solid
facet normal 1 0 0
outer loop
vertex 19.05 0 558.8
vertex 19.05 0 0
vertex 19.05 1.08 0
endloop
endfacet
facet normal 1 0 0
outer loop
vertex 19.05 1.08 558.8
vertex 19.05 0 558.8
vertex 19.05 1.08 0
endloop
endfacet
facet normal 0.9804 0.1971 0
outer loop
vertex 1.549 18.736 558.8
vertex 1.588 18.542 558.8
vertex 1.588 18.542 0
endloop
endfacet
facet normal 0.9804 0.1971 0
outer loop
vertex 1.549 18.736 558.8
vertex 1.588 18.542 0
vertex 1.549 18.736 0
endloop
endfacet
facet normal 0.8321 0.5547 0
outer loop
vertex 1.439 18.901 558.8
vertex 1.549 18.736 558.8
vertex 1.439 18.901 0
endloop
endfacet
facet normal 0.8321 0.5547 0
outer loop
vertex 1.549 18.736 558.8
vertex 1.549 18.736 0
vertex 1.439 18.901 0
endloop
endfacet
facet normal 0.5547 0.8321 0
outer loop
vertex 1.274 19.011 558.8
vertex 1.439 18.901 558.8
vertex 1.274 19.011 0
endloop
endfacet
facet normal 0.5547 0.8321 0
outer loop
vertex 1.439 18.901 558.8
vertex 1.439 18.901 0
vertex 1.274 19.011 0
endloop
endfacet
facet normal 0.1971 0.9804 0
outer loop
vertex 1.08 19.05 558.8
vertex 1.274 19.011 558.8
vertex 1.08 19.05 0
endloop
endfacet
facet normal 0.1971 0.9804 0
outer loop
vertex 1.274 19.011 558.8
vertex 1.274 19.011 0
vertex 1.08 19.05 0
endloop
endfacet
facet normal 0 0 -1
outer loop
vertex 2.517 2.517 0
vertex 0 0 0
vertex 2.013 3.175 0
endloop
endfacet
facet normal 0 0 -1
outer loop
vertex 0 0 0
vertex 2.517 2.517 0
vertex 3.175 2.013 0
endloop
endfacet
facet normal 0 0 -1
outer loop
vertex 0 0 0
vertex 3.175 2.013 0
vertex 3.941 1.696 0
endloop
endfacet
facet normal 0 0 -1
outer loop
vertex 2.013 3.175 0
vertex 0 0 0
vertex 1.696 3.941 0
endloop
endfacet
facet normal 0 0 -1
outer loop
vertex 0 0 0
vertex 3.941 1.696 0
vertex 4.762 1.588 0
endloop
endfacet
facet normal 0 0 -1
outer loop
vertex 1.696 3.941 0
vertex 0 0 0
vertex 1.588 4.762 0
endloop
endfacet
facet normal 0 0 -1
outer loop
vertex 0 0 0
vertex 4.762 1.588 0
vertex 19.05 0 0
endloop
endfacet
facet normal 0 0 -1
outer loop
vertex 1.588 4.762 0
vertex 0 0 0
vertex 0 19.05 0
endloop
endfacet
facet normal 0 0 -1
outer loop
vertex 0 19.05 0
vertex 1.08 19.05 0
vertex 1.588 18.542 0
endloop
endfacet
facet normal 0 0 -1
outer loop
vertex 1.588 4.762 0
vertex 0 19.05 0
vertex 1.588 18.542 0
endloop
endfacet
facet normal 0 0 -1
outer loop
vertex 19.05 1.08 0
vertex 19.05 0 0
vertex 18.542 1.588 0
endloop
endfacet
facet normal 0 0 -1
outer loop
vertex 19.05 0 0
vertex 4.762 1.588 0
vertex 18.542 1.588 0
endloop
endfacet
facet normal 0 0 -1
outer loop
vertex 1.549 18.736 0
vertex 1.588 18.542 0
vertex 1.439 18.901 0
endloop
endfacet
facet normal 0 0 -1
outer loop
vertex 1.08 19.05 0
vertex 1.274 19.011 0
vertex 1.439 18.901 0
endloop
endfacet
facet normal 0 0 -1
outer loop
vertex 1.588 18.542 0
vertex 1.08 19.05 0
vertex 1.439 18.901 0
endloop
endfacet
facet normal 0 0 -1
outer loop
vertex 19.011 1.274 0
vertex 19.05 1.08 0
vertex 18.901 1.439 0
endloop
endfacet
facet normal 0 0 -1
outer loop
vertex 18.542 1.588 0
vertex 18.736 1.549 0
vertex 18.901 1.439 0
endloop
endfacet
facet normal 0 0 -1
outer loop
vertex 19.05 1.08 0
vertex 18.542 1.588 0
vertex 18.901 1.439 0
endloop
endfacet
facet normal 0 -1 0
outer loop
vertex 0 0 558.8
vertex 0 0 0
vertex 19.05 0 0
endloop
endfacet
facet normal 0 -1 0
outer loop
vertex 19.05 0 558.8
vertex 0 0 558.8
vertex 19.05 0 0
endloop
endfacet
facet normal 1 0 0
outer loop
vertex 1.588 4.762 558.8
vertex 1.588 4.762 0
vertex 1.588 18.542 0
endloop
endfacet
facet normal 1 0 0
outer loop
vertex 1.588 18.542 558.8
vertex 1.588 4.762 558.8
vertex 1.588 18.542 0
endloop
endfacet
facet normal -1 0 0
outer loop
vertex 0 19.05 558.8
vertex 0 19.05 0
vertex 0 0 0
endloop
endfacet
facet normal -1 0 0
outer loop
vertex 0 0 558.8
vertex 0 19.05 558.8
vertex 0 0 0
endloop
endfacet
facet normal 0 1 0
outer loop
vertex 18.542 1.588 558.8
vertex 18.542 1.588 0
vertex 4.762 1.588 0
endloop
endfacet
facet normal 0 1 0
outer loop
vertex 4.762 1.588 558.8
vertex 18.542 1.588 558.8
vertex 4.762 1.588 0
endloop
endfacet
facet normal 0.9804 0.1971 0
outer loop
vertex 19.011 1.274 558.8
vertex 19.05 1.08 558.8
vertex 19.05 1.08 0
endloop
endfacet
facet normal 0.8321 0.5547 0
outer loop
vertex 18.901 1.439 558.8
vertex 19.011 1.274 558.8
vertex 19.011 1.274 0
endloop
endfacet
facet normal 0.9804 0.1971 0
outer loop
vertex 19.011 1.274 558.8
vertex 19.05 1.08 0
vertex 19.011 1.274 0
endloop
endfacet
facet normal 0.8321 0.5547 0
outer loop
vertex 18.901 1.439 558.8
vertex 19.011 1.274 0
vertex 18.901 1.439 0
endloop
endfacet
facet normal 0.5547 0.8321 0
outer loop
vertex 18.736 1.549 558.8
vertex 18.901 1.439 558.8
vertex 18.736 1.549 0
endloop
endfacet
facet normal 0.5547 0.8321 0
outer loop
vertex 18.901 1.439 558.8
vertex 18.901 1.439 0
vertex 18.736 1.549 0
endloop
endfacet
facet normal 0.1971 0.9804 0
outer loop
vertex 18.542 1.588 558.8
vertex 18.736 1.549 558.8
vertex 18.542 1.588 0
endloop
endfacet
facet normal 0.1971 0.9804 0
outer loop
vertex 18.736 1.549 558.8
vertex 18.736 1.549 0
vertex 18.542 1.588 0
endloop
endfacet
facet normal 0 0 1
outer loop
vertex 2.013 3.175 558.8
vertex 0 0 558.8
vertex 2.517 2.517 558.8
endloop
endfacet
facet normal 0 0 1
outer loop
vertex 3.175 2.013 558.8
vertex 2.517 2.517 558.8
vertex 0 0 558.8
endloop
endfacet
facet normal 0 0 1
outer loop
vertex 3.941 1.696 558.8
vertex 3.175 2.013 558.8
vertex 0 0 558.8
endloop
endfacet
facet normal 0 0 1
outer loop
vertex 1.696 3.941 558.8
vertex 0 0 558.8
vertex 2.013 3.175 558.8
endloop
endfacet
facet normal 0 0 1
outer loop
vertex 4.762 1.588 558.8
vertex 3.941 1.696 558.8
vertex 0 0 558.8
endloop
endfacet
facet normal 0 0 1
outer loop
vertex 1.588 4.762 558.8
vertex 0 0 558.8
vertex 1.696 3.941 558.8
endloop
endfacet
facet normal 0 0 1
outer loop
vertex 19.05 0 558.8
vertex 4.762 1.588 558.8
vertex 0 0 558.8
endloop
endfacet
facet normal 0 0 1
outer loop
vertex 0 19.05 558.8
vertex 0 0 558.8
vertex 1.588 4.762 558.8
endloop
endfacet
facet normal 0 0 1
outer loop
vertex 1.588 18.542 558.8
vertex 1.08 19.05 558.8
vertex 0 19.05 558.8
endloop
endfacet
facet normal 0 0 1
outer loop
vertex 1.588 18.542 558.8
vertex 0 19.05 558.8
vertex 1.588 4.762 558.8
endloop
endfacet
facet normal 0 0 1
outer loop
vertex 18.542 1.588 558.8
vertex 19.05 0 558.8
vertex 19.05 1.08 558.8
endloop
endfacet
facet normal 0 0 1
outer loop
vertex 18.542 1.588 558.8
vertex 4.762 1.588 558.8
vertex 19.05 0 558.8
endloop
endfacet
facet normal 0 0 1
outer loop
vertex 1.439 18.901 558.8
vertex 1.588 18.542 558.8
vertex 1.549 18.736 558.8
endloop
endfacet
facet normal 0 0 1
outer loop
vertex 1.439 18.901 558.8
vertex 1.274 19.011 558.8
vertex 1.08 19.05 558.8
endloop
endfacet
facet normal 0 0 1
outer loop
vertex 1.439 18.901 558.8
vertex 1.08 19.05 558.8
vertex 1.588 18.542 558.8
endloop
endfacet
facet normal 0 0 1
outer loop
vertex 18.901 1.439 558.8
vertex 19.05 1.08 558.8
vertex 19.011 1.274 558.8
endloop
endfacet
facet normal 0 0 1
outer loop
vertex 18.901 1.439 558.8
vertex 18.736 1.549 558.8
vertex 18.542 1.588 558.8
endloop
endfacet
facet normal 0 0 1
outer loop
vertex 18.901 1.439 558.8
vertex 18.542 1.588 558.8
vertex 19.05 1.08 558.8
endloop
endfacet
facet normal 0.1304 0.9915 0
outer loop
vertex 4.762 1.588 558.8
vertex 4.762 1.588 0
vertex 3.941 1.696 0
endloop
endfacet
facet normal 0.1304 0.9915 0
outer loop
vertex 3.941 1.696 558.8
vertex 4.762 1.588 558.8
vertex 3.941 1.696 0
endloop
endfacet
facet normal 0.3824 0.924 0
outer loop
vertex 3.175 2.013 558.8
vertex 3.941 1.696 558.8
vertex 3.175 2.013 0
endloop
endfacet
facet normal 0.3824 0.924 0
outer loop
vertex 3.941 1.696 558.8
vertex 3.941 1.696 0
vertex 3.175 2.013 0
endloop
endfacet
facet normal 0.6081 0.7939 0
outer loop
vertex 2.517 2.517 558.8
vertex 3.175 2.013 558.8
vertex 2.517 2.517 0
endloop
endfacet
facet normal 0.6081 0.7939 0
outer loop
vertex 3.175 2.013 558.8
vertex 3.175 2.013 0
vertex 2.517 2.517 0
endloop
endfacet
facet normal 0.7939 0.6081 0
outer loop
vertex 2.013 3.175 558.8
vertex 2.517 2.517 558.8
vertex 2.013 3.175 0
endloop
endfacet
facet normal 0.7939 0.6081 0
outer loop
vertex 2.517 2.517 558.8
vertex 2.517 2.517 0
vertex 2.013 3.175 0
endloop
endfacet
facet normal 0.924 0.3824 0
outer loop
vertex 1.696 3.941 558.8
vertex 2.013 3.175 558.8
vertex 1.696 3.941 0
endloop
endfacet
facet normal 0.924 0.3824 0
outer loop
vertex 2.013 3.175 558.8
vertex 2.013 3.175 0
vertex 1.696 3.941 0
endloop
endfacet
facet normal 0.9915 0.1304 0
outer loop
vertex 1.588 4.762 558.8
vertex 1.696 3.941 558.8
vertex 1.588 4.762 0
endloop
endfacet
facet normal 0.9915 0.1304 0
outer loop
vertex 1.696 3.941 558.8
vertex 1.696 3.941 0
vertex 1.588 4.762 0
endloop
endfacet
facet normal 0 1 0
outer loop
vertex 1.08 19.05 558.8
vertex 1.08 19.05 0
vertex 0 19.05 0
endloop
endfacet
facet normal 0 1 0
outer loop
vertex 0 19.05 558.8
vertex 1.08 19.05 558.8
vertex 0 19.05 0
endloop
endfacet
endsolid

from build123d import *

# Parameters (mm, degrees)
F1_DEPTH = 558.8


with BuildPart() as f1:
    # F0 (on Top) → F1 (new body)
    with BuildSketch(Plane.XY):
        with BuildLine():
            Line((0, 19.05), (0, 0))
            Line((0, 0), (19.05, 0))
            Line((19.05, 0), (19.05, 1.0795))
            ThreePointArc((19.05, 1.0795), (18.90121, 1.43871), (18.542, 1.5875))
            Line((18.542, 1.5875), (4.7625, 1.5875))
            ThreePointArc((4.7625, 1.5875), (2.517436, 2.517436), (1.5875, 4.7625))
            Line((1.5875, 4.7625), (1.5875, 18.542))
            ThreePointArc((1.5875, 18.542), (1.43871, 18.90121), (1.0795, 19.05))
            Line((1.0795, 19.05), (0, 19.05))
        make_face()
    extrude(amount=F1_DEPTH)


solid = f1.part
